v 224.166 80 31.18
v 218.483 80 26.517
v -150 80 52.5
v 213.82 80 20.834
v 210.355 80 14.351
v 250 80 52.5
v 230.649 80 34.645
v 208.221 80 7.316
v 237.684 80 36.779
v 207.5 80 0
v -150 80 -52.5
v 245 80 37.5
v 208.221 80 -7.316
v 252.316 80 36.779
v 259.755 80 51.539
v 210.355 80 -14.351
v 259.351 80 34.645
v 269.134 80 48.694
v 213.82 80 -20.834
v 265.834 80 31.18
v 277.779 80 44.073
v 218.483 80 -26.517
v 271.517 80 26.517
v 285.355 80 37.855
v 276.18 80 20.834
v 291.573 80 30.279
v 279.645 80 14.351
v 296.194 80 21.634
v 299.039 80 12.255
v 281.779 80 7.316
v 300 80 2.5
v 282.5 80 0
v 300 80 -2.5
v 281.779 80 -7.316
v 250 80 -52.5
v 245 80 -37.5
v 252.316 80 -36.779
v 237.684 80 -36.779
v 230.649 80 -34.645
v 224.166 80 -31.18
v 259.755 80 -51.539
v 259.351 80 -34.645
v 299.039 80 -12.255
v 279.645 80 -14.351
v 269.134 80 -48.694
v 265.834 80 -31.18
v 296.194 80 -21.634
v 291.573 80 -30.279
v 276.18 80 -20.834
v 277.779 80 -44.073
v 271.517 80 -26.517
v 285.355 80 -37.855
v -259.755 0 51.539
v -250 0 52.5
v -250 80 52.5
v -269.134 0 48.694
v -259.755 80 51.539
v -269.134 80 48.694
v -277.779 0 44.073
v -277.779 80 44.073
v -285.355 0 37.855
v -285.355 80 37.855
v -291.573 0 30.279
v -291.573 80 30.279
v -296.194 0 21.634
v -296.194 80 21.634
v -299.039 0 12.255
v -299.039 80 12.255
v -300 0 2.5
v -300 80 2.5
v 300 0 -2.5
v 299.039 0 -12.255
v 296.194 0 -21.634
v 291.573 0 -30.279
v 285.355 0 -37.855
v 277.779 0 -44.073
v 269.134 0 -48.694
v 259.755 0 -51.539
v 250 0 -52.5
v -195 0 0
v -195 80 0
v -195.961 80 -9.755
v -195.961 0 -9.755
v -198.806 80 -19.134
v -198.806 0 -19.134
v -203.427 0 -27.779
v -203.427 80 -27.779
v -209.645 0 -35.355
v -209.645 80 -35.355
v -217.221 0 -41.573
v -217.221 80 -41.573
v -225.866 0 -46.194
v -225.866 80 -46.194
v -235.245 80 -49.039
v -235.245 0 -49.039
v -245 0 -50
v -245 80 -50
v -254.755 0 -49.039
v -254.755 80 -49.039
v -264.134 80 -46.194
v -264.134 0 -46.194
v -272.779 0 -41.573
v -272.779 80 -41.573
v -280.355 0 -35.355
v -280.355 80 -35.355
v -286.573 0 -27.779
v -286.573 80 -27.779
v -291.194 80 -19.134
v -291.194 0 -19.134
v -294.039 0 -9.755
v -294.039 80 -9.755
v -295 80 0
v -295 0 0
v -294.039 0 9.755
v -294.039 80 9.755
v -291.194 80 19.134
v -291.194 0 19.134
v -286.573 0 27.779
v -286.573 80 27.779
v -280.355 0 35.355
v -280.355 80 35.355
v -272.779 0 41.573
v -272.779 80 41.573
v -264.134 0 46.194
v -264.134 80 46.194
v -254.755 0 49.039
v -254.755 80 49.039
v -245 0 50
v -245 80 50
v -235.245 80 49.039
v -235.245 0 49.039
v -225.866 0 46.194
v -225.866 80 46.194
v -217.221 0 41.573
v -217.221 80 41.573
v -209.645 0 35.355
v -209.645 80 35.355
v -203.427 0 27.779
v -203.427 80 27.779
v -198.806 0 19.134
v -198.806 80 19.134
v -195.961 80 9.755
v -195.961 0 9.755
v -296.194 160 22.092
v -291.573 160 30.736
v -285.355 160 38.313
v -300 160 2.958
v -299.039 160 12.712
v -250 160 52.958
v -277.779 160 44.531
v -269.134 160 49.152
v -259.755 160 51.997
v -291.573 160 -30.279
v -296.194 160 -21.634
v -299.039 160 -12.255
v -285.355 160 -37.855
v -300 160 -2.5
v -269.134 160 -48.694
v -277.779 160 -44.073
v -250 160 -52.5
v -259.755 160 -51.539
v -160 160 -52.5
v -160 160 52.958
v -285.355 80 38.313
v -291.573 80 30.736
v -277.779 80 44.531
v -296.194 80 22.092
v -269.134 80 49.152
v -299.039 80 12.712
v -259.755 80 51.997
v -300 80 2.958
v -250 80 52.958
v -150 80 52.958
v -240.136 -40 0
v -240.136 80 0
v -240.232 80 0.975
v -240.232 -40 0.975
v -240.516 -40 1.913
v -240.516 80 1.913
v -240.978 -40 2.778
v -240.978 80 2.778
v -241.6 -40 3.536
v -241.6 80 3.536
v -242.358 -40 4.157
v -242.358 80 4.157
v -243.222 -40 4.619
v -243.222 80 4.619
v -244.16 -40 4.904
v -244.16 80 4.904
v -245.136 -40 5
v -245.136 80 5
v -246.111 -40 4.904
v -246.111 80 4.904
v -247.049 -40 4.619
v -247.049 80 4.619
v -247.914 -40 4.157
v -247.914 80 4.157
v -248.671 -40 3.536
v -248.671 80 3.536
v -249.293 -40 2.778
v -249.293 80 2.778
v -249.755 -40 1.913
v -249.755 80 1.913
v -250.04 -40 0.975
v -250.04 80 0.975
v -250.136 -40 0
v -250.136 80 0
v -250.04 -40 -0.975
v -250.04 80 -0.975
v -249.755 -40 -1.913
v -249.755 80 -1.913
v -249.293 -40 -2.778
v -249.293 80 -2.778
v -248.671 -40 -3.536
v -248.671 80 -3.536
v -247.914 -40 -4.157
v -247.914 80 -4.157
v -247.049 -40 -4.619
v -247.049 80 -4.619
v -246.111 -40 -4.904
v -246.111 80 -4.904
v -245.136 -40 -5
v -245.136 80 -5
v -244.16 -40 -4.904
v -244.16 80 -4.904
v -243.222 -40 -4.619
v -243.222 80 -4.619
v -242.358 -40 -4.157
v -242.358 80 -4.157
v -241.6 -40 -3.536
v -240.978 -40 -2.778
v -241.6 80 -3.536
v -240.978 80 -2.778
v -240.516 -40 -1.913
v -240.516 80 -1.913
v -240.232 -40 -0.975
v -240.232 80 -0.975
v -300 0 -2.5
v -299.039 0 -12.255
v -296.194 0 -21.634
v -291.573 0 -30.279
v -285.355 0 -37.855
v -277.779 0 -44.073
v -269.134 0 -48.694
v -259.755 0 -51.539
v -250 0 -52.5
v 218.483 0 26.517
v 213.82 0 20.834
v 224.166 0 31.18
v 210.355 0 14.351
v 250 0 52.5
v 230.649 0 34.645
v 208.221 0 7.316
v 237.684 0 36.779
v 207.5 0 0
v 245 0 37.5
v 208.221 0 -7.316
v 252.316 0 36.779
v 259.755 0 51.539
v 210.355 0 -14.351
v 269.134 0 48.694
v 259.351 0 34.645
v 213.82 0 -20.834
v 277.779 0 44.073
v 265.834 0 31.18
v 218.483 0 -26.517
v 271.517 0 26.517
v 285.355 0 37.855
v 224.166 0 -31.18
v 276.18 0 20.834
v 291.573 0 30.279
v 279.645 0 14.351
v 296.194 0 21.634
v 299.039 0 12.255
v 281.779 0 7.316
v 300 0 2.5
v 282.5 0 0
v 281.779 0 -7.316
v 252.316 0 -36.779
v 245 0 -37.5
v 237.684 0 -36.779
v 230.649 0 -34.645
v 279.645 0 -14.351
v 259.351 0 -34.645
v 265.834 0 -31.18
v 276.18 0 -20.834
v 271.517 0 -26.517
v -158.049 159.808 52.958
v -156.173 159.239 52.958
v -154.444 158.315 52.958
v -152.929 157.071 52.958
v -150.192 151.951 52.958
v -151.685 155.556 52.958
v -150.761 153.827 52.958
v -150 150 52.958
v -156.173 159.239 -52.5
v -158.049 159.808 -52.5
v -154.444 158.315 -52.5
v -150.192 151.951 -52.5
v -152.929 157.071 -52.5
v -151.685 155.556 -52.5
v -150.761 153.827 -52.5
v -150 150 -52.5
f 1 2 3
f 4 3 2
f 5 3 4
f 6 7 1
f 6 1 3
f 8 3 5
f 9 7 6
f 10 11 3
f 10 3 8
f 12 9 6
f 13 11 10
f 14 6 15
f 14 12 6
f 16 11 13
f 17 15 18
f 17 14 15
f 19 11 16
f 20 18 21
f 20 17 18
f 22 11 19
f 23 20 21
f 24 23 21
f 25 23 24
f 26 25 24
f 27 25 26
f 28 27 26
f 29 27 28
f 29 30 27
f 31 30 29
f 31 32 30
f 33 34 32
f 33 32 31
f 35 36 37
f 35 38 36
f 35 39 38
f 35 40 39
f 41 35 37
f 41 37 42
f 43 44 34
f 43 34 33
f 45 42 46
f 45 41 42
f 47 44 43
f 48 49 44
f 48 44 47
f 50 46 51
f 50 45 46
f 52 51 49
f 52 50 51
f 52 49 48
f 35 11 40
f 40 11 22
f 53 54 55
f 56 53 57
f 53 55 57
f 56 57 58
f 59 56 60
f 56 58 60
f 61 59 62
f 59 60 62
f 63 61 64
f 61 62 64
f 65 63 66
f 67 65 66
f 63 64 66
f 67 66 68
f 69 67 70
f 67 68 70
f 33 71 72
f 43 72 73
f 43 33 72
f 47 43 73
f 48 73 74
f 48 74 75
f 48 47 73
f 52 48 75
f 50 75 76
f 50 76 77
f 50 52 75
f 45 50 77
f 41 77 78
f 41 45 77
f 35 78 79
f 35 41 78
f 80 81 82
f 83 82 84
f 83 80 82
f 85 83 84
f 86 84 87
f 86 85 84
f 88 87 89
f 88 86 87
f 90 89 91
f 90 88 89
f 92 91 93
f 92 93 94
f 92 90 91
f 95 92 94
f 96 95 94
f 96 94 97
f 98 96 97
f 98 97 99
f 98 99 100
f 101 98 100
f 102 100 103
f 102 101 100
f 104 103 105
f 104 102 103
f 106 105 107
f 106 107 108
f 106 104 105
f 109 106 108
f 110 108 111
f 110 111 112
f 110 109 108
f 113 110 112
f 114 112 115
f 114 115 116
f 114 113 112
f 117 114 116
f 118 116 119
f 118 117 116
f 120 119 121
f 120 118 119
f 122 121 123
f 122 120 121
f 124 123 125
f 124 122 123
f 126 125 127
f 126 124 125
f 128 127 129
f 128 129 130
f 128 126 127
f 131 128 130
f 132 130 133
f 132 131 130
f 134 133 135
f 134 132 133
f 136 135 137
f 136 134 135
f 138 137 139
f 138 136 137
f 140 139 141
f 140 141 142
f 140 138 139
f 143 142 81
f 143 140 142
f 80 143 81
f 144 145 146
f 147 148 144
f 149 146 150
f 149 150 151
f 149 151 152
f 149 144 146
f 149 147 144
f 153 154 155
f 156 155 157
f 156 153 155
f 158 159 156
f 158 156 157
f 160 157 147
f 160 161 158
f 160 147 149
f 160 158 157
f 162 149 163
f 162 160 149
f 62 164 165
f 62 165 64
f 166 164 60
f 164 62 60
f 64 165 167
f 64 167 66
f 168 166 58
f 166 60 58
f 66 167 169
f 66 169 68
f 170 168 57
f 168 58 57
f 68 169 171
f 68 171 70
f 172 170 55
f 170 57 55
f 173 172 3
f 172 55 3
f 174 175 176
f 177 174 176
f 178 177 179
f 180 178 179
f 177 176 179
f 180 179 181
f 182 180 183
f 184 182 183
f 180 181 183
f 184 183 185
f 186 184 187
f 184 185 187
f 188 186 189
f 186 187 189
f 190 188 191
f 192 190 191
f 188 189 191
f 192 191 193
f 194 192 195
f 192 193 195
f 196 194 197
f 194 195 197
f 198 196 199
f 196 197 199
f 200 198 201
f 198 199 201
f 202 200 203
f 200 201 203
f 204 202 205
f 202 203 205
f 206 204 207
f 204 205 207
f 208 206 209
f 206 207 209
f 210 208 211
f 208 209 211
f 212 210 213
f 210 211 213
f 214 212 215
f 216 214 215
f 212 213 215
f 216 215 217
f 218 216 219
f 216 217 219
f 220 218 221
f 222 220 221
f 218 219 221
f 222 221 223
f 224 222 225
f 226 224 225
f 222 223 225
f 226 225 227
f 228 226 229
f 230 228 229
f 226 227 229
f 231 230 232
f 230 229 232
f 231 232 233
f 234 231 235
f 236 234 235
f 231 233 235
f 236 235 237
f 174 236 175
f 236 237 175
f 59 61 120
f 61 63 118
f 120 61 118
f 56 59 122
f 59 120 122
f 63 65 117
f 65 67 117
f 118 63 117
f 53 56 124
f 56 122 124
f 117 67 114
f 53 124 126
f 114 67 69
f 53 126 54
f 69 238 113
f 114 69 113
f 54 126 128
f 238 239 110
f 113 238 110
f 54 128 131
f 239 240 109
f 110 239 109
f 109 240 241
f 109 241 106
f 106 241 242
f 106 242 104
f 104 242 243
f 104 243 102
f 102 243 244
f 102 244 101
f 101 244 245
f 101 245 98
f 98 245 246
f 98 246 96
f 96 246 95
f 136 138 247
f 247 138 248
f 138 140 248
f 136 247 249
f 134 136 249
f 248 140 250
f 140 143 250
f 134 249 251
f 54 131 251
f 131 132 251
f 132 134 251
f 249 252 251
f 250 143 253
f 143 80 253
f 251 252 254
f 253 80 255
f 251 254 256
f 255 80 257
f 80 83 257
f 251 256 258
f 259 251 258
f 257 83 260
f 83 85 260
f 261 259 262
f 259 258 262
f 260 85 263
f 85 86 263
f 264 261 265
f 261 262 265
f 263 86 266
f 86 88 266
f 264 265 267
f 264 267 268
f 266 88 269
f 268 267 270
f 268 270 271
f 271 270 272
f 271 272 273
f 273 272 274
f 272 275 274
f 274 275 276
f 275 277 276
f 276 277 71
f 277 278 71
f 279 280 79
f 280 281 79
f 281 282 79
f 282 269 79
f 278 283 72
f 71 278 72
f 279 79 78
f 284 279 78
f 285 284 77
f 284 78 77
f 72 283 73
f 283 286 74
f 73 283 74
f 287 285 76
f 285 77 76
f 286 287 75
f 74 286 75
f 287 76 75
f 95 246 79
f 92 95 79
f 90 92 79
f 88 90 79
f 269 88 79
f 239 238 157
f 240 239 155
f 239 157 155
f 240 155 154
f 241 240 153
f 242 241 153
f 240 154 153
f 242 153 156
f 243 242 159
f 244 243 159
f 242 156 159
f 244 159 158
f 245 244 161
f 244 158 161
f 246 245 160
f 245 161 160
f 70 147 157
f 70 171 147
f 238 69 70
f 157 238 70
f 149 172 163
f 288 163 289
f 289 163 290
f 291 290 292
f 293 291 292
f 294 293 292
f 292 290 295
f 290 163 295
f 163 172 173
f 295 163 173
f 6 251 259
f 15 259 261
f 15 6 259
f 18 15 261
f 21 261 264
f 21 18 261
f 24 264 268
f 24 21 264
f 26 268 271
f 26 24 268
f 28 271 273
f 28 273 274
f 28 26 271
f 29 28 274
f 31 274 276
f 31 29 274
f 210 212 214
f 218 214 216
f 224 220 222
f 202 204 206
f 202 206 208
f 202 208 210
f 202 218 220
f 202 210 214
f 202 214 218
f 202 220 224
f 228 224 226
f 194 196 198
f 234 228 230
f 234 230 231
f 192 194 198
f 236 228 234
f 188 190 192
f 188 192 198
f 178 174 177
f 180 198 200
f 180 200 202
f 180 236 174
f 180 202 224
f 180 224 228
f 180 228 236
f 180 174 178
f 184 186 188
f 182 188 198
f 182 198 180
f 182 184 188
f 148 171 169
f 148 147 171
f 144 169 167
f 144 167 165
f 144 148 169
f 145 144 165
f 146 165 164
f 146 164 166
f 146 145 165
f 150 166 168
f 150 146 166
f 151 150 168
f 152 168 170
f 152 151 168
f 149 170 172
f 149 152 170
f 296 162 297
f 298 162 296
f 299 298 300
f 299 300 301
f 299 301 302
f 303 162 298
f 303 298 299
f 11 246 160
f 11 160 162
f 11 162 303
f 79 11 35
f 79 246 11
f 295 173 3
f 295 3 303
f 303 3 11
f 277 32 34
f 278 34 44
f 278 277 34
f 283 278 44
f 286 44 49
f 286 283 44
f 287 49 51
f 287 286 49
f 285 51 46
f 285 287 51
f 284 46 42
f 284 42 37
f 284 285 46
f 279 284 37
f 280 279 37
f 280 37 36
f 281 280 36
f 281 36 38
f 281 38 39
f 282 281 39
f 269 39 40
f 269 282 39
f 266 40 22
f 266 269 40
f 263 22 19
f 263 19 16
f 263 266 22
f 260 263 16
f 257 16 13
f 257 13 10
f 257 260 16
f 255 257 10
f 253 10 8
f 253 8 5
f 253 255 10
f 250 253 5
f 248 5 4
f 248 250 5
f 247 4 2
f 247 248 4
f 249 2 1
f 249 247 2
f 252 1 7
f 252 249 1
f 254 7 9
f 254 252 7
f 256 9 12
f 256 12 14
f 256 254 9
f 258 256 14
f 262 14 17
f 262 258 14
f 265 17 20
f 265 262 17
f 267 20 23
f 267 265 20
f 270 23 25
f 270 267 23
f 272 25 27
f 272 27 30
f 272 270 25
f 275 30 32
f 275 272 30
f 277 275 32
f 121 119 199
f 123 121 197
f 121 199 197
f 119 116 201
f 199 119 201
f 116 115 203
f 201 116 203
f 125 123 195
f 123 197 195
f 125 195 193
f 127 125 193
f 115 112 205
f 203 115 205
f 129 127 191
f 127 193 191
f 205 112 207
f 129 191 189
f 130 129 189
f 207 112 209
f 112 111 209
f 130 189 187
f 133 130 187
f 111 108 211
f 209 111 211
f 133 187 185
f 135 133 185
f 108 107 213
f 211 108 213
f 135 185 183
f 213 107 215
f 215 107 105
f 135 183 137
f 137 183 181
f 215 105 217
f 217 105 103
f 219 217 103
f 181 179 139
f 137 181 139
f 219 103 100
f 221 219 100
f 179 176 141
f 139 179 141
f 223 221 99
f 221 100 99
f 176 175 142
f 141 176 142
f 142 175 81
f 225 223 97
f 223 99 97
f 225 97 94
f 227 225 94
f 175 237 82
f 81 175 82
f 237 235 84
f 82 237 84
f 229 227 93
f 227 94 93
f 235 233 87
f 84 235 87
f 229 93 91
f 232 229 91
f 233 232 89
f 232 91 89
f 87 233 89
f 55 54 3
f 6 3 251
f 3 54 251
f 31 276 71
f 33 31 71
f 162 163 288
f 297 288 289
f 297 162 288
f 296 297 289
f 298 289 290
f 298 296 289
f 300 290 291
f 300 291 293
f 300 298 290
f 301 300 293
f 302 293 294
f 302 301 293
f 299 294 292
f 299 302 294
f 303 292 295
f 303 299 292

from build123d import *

# Parameters (mm, degrees)
SKETCH2_W           = 600
SKETCH2_H           = 105
SKETCH2_R           = 50
SKETCH2_R_2         = 37.5
BOSS_EXTRUDE2_DEPTH = 80
SKETCH3_W           = 150
SKETCH3_H           = 105.457586359
BOSS_EXTRUDE3_DEPTH = 80
SKETCH4_R           = 5
BOSS_EXTRUDE4_DEPTH = 120
FILLET1_R           = 10
FILLET3_R           = 50
FILLET4_R           = 50
FILLET5_R           = 50
FILLET6_R           = 50
FILLET7_R           = 50


with BuildPart() as part:
    # Sketch2 → Boss-Extrude2 (new body)
    with BuildSketch(Plane(origin=(0, 0, 0), x_dir=(1, 0, 0), z_dir=(0, 1, 0))):
        Rectangle(SKETCH2_W, SKETCH2_H)
        with Locations((-245, 0)):
            Circle(SKETCH2_R, mode=Mode.SUBTRACT)
        with Locations((245, 0)):
            Circle(SKETCH2_R_2, mode=Mode.SUBTRACT)
    extrude(amount=BOSS_EXTRUDE2_DEPTH)

    # Sketch3 → Boss-Extrude3 (add)
    with BuildSketch(Plane(origin=(0, 80, 0), x_dir=(1, 0, 0), z_dir=(0, 1, 0))):
        with Locations((-225, -0.22879318)):
            Rectangle(SKETCH3_W, SKETCH3_H)
    extrude(amount=BOSS_EXTRUDE3_DEPTH)

    # Sketch4 → Boss-Extrude4 (add)
    with BuildSketch(Plane.XZ.offset(-80)):
        with Locations((-245.135702484, 0)):
            Circle(SKETCH4_R)
    extrude(amount=BOSS_EXTRUDE4_DEPTH)

    # Fillet1
    fillet1_edges = [part.edges().sort_by_distance(p)[0] for p in [
        (-150, 160, 0.22879318),
    ]]
    fillet(fillet1_edges, radius=FILLET1_R)

    # Fillet3
    fillet3_edges = [part.edges().sort_by_distance(p)[0] for p in [
        (300, 40, 52.5),
    ]]
    fillet(fillet3_edges, radius=FILLET3_R)

    # Fillet4
    fillet4_edges = [part.edges().sort_by_distance(p)[0] for p in [
        (300, 40, -52.5),
    ]]
    fillet(fillet4_edges, radius=FILLET4_R)

    # Fillet5
    fillet5_edges = [part.edges().sort_by_distance(p)[0] for p in [
        (-300, 40, 52.5),
    ]]
    fillet(fillet5_edges, radius=FILLET5_R)

    # Fillet6
    fillet6_edges = [part.edges().sort_by_distance(p)[0] for p in [
        (-300, 120, 52.957586359),
    ]]
    fillet(fillet6_edges, radius=FILLET6_R)

    # Fillet7
    fillet7_edges = [part.edges().sort_by_distance(p)[0] for p in [
        (-300, 80, -52.5),
    ]]
    fillet(fillet7_edges, radius=FILLET7_R)


solid = part.part
